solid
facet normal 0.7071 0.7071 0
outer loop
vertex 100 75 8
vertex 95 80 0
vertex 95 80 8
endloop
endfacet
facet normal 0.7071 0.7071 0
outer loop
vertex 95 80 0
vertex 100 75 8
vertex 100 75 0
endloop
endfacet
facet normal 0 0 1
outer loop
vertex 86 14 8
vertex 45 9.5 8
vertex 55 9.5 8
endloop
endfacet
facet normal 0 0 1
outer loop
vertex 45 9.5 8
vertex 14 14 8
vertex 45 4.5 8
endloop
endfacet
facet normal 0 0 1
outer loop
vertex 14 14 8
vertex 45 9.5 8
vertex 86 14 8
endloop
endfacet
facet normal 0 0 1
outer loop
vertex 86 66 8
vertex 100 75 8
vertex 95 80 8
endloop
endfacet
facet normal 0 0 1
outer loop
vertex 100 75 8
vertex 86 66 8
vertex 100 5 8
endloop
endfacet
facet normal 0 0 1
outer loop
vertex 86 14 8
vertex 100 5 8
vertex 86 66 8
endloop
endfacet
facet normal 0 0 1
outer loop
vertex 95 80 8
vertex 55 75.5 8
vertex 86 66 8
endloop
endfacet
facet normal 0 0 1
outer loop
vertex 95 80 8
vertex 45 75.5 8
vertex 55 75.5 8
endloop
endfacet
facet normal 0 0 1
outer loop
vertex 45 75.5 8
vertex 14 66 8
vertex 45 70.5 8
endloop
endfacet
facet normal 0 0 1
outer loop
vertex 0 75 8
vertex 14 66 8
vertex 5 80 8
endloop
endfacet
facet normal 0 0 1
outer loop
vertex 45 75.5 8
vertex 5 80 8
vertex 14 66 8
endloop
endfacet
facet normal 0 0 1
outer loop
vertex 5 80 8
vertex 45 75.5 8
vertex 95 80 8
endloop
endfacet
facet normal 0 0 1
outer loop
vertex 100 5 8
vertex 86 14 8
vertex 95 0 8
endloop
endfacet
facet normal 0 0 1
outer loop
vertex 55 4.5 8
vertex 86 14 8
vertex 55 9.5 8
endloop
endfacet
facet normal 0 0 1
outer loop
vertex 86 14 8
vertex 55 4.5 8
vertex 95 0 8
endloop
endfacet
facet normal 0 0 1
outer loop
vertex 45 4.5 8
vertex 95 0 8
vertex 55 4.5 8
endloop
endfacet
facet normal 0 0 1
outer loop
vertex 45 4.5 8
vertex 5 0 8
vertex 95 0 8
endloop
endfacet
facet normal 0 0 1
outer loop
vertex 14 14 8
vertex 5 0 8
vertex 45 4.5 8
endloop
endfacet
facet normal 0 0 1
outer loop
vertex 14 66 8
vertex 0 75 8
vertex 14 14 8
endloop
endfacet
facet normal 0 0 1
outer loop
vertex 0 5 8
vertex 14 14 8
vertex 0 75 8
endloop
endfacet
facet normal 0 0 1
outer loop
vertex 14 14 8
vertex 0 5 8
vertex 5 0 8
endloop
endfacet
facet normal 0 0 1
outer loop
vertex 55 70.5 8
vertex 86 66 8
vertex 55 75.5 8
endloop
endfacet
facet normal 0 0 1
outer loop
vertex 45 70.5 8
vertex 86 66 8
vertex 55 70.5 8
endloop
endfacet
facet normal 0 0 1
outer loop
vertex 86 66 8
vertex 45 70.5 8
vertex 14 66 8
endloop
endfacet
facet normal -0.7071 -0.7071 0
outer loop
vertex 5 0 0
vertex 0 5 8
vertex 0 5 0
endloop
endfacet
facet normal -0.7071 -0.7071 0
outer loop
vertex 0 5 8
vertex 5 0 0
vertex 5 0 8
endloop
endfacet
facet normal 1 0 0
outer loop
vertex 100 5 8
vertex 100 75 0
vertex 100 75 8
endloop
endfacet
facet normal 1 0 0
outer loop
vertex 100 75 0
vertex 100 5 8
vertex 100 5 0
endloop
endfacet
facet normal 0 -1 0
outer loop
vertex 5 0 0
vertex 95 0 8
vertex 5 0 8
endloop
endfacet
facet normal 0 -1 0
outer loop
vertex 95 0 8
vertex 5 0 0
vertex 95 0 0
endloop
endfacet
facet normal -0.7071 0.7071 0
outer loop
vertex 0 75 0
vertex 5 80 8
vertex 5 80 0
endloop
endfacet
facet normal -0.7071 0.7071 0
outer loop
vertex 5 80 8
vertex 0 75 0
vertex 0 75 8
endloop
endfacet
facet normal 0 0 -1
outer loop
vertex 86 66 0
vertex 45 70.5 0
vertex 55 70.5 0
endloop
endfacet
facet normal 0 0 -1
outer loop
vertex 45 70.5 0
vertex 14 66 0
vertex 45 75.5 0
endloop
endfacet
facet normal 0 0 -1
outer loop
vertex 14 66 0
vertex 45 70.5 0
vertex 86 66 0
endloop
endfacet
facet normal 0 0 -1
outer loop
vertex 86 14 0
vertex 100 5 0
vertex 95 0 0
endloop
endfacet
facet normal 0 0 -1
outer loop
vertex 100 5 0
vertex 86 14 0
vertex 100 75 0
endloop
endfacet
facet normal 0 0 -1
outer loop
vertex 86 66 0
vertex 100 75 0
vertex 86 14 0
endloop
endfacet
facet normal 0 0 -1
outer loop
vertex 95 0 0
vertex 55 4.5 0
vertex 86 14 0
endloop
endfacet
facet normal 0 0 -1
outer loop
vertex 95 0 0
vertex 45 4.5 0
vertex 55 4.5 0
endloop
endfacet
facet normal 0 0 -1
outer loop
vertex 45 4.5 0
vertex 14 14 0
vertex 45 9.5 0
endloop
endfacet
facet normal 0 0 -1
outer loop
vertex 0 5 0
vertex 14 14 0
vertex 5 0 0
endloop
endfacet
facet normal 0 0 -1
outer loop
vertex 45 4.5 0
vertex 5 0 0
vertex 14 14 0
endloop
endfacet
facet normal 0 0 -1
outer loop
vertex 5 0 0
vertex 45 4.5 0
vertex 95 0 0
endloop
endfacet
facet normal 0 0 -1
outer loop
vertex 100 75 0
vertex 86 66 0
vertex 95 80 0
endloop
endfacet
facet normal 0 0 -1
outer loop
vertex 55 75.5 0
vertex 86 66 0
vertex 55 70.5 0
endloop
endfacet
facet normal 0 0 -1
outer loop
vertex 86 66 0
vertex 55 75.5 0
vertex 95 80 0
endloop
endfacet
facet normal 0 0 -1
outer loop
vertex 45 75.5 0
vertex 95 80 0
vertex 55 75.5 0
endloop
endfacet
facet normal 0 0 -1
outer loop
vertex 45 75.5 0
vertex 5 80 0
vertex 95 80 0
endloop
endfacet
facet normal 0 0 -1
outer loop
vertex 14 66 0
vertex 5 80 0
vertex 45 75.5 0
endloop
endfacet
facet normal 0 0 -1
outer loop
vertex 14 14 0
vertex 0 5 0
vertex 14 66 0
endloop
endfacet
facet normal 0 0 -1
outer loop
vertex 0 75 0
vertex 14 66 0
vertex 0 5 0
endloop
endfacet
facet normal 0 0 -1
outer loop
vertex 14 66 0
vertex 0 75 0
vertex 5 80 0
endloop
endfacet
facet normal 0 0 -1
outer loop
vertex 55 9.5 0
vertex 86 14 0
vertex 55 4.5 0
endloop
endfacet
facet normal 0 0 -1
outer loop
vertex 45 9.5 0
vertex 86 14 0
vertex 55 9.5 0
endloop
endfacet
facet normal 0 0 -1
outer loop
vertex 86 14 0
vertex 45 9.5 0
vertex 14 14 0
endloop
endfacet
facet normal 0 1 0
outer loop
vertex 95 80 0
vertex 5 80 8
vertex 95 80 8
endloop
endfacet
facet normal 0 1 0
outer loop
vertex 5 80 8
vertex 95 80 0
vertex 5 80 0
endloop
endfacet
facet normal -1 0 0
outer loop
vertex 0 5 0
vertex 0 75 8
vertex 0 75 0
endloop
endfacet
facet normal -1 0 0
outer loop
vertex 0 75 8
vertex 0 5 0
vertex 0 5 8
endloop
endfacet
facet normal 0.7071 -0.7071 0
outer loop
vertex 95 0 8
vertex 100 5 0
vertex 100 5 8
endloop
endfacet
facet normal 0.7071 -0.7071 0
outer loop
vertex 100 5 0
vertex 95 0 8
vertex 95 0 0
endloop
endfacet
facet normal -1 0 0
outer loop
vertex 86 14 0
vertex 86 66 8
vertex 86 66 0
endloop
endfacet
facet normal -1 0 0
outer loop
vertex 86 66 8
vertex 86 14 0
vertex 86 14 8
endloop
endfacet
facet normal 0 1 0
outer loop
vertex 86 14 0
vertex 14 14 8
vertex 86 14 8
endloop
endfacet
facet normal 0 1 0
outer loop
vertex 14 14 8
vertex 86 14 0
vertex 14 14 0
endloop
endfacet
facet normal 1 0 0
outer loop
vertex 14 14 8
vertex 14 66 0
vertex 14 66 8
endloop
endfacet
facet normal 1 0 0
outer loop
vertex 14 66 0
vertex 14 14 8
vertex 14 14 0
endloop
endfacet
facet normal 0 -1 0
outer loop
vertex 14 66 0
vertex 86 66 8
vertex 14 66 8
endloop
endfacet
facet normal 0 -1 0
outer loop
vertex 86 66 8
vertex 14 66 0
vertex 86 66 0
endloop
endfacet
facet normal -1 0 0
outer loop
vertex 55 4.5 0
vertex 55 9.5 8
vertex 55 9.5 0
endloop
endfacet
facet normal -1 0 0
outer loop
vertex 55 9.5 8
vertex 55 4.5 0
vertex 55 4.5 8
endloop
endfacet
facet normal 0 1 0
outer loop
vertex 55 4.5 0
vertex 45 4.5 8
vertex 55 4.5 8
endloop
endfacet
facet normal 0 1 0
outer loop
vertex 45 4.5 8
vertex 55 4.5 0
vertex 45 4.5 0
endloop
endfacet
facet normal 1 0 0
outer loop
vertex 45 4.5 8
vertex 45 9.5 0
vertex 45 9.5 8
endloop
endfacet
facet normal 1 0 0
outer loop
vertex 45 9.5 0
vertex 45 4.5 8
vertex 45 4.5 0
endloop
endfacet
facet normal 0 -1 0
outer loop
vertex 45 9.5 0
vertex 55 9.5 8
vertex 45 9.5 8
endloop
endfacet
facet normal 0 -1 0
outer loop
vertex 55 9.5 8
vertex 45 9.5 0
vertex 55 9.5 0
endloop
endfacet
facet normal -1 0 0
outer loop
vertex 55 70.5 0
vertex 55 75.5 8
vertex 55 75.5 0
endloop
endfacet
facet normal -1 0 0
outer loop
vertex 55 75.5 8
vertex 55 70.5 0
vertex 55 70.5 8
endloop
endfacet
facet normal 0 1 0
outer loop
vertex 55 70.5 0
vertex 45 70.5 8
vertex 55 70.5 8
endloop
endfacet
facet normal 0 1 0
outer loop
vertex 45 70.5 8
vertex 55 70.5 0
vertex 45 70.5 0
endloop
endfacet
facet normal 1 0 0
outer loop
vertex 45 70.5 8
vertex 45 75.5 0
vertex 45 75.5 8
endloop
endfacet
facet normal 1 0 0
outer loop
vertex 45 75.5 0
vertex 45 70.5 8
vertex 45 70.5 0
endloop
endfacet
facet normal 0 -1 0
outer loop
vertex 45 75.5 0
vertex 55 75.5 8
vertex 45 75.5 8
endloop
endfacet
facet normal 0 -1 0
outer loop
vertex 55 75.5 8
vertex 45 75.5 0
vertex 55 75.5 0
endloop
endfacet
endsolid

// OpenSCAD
$fn = 32;

// ----------------------------------------------------------------------
// Frame plate: 100 x 80 frame, 14 mm rails
// ----------------------------------------------------------------------

// --- parameters (mm) ---
plate_l = 100;            // plate length, X
plate_w = 80;             // plate width, Y
plate_t = 8;              // plate thickness, Z (extrusion height)
corner_c = 5;             // corner chamfer
frame_bar = 14;           // frame rail width
slot_l = 10;              // adjustment slot length
slot_w = 5;               // adjustment slot width

win_l = plate_l - 2 * frame_bar;  // window length
win_w = plate_w - 2 * frame_bar;  // window width

profile = [[5, 0], [95, 0], [100, 5], [100, 75], [95, 80], [5, 80], [0, 75], [0, 5]];  // primary outline, 8 points, counter clockwise
void_1 = [[14, 14], [86, 14], [86, 66], [14, 66]];  // the window, 4 points
void_2 = [[45, 4.5], [55, 4.5], [55, 9.5], [45, 9.5]];  // adjustment slot, 4 points
void_3 = [[45, 70.5], [55, 70.5], [55, 75.5], [45, 75.5]];  // adjustment slot, 4 points

// --- the one profile operation ---
difference() {
  linear_extrude(height = plate_t) polygon(points = profile);
  translate([0, 0, -1])
    linear_extrude(height = plate_t + 2) polygon(points = void_1);
  translate([0, 0, -1])
    linear_extrude(height = plate_t + 2) polygon(points = void_2);
  translate([0, 0, -1])
    linear_extrude(height = plate_t + 2) polygon(points = void_3);
}
